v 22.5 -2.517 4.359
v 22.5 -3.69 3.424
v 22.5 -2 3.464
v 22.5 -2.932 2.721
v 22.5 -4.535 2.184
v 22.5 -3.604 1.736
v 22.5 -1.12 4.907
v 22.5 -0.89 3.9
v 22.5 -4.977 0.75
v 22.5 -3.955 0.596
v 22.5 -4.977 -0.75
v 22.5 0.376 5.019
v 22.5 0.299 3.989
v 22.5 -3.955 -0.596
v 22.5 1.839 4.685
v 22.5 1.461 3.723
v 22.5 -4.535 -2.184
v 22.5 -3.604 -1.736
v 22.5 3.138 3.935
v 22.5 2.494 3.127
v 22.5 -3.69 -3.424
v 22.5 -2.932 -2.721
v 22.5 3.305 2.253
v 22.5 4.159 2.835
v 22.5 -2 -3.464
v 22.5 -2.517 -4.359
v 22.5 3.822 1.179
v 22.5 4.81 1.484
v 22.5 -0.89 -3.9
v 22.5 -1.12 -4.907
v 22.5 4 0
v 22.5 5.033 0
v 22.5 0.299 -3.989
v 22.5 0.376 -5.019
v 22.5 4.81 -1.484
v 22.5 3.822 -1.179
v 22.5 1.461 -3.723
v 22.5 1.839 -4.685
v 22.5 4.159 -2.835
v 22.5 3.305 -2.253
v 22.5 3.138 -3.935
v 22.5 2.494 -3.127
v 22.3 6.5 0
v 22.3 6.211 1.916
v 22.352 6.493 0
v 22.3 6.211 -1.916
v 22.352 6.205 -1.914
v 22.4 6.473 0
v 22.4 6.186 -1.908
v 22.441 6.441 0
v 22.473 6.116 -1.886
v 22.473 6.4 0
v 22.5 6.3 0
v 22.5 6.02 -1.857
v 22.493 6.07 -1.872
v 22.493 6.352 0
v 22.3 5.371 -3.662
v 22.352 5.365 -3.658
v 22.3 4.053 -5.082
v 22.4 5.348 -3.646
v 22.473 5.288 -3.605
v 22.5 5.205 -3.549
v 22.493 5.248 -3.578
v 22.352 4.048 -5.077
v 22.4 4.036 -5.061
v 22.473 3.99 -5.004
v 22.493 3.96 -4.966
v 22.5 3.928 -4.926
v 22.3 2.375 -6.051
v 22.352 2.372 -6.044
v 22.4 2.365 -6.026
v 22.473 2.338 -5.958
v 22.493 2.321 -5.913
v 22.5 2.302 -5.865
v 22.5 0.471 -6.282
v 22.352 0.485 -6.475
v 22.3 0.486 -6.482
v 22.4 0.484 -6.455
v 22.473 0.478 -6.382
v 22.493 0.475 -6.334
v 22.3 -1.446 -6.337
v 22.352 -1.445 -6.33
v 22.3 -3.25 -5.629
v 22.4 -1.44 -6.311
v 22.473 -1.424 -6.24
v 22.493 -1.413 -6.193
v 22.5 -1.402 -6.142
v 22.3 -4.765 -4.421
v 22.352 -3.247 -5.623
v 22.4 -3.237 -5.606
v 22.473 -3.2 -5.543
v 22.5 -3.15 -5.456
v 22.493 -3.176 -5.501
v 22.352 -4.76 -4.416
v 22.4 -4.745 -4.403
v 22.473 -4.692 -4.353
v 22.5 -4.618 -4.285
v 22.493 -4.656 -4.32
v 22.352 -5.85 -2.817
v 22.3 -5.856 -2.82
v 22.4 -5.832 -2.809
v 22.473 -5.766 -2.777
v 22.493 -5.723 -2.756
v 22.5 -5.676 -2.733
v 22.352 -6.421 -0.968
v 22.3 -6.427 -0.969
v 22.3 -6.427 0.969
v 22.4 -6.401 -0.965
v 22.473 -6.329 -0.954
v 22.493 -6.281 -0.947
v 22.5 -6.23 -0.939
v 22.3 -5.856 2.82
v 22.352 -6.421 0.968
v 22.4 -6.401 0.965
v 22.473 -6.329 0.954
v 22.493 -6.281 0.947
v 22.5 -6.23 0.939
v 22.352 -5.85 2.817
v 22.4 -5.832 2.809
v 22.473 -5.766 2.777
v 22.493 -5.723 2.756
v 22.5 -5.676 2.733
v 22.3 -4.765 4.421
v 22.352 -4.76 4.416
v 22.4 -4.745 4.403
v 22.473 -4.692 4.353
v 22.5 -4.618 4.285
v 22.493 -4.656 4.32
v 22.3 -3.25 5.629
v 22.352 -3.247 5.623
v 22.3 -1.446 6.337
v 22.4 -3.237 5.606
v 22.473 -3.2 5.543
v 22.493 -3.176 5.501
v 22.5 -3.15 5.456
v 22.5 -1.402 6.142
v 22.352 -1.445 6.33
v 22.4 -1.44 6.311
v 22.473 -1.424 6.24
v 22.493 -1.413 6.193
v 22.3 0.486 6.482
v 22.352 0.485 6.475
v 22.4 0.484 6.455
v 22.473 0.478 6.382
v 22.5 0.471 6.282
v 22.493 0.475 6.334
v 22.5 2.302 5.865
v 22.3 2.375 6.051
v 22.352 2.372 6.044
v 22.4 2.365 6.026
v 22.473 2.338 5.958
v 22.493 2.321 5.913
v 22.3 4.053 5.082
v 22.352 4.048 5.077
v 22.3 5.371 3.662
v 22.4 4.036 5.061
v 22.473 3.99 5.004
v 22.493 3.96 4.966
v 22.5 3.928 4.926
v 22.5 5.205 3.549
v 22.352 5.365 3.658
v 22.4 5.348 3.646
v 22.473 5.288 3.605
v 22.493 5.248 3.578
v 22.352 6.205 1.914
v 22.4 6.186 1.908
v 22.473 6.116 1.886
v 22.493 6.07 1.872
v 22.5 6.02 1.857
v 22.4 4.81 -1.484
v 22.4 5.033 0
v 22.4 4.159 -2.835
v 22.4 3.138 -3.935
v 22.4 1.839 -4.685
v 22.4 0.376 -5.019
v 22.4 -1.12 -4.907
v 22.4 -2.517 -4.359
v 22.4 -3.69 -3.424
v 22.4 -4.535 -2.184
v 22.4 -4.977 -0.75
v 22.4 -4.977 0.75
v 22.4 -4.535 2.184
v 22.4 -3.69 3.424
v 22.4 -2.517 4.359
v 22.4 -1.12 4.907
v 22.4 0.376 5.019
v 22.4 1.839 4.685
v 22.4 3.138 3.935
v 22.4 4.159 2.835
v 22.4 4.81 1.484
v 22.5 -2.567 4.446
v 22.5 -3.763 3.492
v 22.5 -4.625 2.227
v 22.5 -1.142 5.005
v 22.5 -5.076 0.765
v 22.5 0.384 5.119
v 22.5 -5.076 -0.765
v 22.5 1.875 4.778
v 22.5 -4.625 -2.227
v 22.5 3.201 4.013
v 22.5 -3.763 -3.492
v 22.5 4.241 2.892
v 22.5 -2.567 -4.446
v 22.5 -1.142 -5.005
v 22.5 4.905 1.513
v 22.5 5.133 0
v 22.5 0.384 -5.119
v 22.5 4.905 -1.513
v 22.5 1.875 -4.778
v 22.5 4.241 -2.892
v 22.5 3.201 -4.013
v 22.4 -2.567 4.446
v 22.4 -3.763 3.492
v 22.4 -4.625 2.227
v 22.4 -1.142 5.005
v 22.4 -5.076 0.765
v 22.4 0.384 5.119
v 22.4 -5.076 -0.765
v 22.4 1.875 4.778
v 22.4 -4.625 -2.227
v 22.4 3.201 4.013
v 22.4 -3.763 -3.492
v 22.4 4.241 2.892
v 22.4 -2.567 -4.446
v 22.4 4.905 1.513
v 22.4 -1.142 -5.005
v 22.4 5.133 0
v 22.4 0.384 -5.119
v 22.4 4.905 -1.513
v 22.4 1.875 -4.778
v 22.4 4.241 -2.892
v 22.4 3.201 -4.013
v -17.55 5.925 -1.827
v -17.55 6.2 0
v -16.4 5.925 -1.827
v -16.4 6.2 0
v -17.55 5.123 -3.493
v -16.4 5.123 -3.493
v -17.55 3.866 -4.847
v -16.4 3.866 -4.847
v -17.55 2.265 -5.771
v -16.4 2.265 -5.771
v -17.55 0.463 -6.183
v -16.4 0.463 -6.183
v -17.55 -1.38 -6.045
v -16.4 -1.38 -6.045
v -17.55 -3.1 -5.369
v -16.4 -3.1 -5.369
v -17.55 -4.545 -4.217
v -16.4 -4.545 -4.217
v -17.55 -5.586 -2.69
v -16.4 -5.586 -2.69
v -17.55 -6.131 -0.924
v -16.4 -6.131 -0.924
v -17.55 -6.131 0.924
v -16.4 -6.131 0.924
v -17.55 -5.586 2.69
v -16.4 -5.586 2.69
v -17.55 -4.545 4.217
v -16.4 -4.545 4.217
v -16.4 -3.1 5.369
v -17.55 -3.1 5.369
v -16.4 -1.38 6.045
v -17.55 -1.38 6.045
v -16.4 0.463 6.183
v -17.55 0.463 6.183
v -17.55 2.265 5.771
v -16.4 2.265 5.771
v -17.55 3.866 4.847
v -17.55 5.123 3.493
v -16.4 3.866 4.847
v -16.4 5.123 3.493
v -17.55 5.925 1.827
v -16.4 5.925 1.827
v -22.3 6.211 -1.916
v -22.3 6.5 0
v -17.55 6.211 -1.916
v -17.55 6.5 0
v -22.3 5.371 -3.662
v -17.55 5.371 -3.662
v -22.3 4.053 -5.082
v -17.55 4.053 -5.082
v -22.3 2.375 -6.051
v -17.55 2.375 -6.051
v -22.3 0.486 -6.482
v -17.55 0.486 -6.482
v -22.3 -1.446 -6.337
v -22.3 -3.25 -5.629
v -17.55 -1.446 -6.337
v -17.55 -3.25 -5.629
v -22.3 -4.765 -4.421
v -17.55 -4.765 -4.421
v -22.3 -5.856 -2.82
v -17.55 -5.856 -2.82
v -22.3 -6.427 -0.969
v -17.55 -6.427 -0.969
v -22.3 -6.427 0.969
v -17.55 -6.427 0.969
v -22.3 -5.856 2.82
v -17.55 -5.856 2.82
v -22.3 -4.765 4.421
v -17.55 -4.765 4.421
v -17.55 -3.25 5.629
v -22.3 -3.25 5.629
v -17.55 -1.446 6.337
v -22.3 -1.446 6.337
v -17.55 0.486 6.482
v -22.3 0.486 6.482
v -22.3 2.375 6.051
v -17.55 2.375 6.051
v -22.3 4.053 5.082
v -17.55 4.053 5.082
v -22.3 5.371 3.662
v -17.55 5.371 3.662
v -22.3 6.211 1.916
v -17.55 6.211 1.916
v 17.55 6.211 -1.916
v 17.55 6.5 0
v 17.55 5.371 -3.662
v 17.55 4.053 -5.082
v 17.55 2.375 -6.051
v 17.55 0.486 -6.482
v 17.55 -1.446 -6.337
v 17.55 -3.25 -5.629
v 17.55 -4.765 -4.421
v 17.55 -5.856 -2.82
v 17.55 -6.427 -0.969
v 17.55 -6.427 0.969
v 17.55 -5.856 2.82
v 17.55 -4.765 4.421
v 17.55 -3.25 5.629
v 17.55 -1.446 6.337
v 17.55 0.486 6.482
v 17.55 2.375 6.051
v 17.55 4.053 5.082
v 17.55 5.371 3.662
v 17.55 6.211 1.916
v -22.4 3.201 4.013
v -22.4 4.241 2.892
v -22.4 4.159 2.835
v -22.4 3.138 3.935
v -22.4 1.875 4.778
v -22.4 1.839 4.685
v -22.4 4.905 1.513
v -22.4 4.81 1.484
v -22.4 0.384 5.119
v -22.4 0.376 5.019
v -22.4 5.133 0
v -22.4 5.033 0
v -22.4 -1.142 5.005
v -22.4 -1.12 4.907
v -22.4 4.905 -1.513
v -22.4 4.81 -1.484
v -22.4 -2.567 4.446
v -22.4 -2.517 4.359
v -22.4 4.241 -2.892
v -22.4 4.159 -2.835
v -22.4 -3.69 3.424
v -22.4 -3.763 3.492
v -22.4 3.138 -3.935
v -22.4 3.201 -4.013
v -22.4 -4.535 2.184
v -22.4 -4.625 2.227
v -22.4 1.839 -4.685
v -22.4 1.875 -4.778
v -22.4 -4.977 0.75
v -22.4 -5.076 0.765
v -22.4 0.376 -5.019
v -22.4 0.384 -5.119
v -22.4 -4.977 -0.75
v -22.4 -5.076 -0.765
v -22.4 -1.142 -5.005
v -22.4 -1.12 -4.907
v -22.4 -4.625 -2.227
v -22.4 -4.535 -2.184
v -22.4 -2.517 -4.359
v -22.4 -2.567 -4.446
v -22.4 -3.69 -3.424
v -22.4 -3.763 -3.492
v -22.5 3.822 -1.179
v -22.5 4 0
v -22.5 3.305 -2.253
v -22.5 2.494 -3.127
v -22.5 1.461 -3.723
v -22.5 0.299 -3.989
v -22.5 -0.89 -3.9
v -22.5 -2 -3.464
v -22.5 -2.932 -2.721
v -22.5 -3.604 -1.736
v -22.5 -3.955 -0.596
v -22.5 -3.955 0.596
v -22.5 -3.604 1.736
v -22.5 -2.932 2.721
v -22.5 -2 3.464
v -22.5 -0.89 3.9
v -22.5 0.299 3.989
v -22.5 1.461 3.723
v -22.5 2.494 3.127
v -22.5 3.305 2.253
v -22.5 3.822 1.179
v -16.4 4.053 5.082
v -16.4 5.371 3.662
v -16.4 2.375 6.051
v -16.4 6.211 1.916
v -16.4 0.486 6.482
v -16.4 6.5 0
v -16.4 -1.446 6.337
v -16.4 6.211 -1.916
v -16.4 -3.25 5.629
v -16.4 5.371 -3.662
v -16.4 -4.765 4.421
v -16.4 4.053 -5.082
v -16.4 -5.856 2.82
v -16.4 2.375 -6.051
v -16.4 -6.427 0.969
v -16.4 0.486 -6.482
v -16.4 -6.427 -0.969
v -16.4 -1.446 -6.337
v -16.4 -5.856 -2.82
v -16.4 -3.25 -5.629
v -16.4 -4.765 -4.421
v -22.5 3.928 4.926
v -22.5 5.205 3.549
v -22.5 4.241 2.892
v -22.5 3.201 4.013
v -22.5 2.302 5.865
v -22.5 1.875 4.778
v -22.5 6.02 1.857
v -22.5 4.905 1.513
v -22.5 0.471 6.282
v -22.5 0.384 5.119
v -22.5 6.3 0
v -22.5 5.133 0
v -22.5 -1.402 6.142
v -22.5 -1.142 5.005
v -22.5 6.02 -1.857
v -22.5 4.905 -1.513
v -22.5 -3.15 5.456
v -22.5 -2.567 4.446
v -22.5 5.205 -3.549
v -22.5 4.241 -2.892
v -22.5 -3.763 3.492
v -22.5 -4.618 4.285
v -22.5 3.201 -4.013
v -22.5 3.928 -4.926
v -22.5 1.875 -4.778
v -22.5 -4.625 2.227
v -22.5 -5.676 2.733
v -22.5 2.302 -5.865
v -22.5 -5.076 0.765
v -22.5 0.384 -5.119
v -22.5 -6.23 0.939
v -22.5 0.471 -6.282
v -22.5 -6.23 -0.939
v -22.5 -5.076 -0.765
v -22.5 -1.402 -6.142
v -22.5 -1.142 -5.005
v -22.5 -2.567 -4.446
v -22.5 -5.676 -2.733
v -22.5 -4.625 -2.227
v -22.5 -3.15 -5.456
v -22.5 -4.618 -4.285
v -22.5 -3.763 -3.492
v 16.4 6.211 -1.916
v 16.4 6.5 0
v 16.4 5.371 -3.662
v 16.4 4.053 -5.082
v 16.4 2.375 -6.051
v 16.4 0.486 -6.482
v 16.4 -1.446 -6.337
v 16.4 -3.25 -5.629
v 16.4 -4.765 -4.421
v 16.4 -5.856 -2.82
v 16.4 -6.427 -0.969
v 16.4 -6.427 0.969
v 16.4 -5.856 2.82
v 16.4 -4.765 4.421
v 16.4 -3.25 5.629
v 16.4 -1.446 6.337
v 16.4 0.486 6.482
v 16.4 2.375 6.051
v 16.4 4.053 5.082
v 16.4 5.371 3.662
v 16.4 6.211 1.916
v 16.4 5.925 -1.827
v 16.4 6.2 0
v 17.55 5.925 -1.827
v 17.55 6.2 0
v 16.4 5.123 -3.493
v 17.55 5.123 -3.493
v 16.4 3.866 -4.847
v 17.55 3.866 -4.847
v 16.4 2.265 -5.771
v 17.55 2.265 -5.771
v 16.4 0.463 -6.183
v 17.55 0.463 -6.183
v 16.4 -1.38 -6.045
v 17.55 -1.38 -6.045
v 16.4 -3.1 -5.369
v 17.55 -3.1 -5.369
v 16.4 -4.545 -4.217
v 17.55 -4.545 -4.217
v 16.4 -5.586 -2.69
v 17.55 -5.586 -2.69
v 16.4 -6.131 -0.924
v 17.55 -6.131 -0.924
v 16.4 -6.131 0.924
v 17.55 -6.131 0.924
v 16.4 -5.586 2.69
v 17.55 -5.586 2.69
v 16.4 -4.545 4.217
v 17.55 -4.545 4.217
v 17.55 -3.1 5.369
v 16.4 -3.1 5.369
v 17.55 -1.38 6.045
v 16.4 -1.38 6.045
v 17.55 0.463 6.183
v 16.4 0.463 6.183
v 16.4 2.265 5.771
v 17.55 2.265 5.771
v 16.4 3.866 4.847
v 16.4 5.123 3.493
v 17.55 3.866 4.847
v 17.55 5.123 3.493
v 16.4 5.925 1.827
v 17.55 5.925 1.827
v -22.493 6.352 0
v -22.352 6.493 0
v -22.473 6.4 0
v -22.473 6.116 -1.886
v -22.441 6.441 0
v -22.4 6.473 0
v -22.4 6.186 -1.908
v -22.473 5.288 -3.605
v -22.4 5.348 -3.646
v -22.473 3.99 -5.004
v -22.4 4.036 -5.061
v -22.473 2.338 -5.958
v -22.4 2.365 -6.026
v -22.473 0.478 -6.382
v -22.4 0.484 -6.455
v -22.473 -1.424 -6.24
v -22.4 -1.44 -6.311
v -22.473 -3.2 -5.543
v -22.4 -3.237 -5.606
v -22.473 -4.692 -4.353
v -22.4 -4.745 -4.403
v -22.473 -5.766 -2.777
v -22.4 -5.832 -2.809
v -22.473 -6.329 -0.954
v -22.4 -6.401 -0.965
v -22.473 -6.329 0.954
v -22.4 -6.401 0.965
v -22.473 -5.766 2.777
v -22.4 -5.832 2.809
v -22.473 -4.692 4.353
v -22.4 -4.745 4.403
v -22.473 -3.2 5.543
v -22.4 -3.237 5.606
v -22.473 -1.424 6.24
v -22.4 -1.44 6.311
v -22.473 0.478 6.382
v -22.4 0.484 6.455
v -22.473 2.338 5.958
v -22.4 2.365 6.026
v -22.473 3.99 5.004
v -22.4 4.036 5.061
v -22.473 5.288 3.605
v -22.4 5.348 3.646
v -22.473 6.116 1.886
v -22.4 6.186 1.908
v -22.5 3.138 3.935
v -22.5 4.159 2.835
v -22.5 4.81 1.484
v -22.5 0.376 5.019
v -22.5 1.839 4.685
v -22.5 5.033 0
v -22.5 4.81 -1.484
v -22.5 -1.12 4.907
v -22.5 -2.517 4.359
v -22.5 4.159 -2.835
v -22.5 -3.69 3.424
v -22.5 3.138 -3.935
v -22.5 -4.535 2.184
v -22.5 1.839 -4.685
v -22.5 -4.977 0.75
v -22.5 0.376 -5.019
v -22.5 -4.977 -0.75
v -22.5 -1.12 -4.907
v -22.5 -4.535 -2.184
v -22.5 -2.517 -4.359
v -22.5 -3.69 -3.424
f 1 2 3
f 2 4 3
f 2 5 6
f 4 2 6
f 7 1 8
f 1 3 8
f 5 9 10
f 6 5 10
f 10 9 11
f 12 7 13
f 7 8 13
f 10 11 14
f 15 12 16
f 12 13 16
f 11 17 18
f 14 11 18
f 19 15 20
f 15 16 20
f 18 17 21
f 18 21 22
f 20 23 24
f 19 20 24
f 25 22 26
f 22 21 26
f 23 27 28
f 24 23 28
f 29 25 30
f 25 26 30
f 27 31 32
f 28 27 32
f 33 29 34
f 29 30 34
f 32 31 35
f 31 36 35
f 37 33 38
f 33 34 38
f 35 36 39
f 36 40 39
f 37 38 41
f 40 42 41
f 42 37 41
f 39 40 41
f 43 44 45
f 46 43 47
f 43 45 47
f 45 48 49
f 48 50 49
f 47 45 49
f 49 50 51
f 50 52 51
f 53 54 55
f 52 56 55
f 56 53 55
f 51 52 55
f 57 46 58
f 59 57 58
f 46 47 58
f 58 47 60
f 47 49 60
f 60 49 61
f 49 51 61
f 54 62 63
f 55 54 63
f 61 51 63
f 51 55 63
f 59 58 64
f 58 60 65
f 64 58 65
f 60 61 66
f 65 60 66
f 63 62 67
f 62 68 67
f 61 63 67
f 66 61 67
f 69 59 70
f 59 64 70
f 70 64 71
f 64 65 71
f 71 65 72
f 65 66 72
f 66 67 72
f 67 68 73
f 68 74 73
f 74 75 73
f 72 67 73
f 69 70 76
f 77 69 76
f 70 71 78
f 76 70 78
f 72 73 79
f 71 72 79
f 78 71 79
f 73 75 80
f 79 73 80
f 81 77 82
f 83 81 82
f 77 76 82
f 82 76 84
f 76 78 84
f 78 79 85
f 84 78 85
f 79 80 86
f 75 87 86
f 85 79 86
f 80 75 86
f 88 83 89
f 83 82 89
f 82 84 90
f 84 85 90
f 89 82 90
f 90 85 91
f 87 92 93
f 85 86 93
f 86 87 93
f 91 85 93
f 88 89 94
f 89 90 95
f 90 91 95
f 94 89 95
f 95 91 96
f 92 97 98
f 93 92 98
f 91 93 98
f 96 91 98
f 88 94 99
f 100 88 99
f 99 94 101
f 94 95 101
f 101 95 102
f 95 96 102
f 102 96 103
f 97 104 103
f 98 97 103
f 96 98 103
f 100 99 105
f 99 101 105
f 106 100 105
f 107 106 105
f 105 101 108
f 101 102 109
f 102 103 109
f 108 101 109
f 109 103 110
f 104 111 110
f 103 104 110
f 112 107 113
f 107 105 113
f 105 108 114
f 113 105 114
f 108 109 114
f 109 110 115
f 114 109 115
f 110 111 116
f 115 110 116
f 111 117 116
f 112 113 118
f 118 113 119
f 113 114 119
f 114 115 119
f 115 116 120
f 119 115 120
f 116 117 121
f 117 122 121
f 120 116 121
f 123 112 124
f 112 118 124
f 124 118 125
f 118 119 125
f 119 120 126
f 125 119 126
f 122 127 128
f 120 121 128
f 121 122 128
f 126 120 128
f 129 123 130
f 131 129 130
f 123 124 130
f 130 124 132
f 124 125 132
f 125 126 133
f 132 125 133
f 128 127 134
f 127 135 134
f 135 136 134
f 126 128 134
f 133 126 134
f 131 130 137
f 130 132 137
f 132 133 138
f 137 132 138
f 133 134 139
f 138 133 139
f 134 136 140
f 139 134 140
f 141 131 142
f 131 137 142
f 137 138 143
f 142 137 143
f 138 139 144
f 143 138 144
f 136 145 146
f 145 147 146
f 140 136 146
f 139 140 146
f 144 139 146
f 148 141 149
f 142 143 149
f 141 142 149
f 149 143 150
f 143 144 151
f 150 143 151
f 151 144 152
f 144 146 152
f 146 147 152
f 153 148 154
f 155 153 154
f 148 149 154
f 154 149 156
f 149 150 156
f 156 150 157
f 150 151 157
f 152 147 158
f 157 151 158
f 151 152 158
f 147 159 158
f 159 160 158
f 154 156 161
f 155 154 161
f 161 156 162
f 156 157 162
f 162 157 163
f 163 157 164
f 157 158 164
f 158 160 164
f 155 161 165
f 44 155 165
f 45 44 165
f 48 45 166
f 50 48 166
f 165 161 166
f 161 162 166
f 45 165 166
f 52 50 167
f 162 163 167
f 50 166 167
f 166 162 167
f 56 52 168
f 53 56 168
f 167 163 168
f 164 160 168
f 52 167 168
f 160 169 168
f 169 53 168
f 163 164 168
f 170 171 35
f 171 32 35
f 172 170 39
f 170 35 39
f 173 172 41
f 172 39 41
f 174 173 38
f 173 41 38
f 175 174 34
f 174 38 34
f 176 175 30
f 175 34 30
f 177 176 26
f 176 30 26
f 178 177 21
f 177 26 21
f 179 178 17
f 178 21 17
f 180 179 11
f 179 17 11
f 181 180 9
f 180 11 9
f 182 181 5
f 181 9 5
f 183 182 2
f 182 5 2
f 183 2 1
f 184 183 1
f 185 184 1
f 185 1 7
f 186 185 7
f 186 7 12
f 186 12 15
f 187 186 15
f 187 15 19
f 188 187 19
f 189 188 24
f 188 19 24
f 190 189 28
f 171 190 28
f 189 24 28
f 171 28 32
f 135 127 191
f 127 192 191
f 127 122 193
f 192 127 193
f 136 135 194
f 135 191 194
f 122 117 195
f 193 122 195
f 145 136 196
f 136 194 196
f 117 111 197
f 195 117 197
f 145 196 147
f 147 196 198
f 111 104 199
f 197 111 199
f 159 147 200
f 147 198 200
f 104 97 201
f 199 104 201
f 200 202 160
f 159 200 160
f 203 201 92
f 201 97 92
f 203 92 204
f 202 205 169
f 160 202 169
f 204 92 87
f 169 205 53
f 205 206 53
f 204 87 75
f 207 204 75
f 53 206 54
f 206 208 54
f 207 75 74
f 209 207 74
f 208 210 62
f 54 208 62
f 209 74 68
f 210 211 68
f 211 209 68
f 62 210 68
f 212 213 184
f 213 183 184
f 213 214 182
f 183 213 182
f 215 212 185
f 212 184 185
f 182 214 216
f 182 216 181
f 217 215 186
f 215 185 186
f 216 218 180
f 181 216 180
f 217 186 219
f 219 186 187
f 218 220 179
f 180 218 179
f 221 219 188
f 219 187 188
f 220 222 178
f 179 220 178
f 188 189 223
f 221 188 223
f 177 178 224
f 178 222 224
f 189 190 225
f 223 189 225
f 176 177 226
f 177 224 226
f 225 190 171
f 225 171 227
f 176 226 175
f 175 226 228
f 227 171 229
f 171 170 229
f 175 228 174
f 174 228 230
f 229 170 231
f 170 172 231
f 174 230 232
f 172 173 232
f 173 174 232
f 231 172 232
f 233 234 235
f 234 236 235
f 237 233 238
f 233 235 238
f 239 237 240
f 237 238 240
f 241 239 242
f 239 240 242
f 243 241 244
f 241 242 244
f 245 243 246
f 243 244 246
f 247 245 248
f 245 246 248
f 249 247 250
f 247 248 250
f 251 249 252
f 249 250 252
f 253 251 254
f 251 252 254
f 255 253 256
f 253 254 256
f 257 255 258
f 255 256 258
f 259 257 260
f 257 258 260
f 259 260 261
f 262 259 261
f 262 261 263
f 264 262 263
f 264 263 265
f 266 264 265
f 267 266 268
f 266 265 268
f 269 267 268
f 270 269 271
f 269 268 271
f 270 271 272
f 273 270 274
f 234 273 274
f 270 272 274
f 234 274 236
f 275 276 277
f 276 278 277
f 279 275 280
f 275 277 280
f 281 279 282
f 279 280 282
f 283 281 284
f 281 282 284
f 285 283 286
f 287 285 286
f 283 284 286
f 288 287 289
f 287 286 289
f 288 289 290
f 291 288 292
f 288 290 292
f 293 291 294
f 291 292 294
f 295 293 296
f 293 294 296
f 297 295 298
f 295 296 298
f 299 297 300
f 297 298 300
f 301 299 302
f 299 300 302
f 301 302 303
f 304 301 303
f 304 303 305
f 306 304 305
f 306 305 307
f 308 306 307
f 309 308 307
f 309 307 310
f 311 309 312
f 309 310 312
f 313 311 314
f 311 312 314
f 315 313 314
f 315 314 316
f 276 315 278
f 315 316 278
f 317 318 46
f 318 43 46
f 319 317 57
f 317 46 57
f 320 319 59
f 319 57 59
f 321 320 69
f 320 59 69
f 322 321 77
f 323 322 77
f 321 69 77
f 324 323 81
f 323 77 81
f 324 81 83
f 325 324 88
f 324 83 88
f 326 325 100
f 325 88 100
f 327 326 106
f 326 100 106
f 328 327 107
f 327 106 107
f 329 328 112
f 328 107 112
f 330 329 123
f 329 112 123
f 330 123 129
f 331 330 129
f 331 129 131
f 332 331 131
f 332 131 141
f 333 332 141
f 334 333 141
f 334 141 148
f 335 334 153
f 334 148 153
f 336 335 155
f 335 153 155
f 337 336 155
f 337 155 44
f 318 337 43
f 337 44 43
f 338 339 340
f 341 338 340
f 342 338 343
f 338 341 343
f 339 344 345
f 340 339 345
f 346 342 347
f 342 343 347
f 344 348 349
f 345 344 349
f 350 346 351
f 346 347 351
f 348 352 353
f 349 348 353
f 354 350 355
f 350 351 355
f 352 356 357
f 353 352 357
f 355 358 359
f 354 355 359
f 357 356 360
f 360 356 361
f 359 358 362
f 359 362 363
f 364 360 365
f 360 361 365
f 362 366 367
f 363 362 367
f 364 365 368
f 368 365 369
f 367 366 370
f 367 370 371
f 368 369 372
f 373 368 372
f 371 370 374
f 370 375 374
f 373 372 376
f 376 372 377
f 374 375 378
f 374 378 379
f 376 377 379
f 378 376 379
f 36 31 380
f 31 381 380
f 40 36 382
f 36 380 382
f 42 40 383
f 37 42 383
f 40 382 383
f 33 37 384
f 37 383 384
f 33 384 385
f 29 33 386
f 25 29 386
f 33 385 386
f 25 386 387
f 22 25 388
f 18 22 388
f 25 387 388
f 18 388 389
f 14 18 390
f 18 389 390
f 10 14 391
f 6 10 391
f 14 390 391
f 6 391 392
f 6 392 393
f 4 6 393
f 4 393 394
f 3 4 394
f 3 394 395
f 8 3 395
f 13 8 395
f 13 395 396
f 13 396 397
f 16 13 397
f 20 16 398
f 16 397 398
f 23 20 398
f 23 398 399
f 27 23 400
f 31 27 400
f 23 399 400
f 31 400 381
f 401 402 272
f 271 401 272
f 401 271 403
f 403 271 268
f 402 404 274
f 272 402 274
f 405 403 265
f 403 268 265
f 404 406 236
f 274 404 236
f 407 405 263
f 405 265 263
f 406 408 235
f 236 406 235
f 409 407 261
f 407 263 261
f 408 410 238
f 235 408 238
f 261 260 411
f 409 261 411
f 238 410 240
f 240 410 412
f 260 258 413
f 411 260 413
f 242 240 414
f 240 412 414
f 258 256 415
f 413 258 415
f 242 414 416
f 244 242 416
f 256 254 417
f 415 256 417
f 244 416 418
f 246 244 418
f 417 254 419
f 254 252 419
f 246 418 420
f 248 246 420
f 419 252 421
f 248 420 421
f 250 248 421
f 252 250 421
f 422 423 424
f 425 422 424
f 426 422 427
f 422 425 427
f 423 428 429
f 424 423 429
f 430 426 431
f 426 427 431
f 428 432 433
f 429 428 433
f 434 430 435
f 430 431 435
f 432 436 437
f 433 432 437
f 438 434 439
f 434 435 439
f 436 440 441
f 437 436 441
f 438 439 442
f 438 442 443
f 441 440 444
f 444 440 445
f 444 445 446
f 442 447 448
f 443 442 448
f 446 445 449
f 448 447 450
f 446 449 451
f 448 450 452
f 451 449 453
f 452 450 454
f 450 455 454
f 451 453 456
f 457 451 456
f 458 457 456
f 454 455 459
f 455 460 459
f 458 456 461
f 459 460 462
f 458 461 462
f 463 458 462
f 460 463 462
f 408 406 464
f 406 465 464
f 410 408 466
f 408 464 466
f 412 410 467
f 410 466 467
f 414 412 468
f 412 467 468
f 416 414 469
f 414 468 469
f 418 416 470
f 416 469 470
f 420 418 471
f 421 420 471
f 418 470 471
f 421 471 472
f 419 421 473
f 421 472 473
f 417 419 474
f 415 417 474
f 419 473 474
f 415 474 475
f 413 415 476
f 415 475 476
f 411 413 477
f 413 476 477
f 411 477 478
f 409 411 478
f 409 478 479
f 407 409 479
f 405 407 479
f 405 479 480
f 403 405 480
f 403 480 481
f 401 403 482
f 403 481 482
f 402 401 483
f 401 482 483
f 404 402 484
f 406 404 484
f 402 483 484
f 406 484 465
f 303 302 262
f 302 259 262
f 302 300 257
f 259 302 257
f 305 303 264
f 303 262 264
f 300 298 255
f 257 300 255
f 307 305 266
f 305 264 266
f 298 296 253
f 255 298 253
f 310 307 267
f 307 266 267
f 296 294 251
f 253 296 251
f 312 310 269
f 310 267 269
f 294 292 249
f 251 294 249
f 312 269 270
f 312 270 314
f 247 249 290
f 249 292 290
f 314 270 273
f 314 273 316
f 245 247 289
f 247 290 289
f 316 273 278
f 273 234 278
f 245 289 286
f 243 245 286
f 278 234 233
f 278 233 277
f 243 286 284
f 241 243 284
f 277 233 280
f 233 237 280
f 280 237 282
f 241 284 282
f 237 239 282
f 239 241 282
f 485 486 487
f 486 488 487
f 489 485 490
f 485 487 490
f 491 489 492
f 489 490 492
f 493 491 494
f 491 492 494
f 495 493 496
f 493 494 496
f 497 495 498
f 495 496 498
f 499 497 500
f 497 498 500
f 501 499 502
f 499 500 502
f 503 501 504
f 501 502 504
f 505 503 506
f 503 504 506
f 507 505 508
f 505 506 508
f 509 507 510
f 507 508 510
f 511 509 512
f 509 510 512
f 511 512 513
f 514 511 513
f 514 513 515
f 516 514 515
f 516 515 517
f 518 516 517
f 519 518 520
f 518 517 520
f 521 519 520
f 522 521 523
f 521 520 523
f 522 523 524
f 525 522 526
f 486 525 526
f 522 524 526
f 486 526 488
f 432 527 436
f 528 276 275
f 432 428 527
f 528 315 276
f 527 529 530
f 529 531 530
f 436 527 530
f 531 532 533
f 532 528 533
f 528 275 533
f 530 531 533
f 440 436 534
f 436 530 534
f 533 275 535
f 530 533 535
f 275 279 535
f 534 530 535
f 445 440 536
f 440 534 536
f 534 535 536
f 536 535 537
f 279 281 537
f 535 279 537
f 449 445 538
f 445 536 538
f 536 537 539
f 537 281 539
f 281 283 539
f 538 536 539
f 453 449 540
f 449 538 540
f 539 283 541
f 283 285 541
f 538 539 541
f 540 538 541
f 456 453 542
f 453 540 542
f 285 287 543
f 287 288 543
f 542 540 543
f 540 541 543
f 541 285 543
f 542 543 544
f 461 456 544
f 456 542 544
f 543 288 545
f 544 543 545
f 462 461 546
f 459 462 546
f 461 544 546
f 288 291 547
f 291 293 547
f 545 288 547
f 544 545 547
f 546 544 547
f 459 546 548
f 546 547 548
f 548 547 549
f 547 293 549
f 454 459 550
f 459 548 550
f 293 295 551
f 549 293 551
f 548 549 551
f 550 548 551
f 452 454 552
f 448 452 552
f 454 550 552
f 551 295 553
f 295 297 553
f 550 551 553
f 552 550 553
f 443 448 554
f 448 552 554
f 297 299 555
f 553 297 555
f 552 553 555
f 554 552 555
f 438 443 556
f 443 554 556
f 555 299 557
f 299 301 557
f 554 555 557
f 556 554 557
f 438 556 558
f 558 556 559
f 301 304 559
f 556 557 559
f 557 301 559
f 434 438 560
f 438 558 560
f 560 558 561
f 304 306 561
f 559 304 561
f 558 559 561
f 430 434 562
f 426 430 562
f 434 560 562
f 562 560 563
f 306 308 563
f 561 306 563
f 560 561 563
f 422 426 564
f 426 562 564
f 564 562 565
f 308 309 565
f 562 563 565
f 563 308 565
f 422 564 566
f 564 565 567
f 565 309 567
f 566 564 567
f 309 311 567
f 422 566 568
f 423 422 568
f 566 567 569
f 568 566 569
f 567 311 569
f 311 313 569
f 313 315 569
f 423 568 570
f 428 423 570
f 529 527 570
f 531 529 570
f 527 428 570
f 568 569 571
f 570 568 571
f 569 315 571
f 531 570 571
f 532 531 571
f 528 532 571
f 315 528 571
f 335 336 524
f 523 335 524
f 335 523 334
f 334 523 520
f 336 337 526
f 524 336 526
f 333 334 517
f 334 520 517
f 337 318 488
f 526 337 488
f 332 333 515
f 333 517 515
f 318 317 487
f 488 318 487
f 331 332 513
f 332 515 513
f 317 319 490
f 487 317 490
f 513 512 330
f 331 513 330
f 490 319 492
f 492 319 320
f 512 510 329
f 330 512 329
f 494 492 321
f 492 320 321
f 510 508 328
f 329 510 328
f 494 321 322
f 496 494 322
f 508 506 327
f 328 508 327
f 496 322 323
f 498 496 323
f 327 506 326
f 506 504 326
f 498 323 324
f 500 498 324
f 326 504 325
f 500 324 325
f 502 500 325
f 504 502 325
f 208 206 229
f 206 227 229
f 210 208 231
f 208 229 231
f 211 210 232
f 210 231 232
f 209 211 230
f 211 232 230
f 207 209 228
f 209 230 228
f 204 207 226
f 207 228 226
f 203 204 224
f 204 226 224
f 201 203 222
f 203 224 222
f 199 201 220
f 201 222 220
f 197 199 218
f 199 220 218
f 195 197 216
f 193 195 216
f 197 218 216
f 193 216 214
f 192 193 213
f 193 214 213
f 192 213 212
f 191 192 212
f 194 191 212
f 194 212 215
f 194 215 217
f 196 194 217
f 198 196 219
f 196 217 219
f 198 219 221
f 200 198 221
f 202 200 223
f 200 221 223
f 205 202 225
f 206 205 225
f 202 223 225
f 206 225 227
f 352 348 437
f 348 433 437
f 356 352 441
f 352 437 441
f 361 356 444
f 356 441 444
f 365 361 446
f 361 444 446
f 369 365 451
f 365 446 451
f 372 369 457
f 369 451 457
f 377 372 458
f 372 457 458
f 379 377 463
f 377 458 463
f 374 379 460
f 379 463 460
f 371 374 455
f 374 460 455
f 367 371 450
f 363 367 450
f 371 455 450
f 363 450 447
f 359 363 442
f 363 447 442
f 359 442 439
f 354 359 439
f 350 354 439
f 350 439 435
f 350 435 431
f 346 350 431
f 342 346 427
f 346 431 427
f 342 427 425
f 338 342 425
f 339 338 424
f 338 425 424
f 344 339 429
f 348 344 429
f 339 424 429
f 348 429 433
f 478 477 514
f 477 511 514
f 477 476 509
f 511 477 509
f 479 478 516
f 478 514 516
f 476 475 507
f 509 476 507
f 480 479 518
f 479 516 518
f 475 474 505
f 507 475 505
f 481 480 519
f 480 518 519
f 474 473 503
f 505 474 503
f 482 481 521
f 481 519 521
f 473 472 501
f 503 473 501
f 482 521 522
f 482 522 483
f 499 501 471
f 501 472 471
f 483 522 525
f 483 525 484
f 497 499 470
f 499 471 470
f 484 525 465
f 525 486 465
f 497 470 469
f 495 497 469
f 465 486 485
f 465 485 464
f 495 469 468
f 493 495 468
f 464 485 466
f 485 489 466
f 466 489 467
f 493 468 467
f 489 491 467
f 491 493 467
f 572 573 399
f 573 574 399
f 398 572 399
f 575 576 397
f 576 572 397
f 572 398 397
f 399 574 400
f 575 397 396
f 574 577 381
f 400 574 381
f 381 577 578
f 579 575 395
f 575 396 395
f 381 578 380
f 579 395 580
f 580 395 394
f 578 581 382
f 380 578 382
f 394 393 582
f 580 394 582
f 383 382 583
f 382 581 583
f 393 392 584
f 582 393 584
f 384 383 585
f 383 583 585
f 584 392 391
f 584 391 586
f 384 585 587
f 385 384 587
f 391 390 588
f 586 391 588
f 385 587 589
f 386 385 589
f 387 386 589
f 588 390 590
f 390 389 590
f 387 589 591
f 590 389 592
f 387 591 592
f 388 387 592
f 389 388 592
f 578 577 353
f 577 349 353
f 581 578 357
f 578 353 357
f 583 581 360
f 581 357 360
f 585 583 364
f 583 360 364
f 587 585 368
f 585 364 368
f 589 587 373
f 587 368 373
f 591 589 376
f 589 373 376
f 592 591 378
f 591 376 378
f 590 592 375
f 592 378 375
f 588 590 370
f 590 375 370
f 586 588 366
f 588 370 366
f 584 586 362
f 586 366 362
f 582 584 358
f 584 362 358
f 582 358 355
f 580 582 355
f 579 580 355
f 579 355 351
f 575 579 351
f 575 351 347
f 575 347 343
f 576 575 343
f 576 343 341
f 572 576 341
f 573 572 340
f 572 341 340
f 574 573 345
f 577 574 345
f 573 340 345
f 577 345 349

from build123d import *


with BuildPart() as part:
    # Sketch1 → Revolve1 (revolve)
    with BuildSketch(Plane(origin=(0, 0, 0), x_dir=(-1, 0, 0), z_dir=(0, 0, -1))):
        with BuildLine():
            Line((-22.4, 5.033333333), (-22.5, 5.033333333))
            Line((-22.5, 5.033333333), (-22.5, 4))
            Line((-22.5, 4), (22.5, 4))
            Line((22.5, 4), (22.5, 5.033333333))
            Line((22.5, 5.033333333), (22.4, 5.033333333))
            Line((22.4, 5.033333333), (22.4, 5.133333333))
            Line((22.4, 5.133333333), (22.5, 5.133333333))
            Line((22.5, 5.133333333), (22.5, 6.3))
            ThreePointArc((22.5, 6.3), (22.441421356, 6.441421356), (22.3, 6.5))
            Line((22.3, 6.5), (17.55, 6.5))
            Line((17.55, 6.5), (17.55, 6.2))
            Line((17.55, 6.2), (16.4, 6.2))
            Line((16.4, 6.2), (16.4, 6.5))
            Line((16.4, 6.5), (-16.4, 6.5))
            Line((-16.4, 6.5), (-16.4, 6.2))
            Line((-16.4, 6.2), (-17.55, 6.2))
            Line((-17.55, 6.2), (-17.55, 6.5))
            Line((-17.55, 6.5), (-22.3, 6.5))
            ThreePointArc((-22.3, 6.5), (-22.441421356, 6.441421356), (-22.5, 6.3))
            Line((-22.5, 6.3), (-22.5, 5.133333333))
            Line((-22.5, 5.133333333), (-22.4, 5.133333333))
            Line((-22.4, 5.133333333), (-22.4, 5.033333333))
        make_face()
    revolve(axis=Axis((22.5, 0, 0), (-1, 0, 0)))


solid = part.part
